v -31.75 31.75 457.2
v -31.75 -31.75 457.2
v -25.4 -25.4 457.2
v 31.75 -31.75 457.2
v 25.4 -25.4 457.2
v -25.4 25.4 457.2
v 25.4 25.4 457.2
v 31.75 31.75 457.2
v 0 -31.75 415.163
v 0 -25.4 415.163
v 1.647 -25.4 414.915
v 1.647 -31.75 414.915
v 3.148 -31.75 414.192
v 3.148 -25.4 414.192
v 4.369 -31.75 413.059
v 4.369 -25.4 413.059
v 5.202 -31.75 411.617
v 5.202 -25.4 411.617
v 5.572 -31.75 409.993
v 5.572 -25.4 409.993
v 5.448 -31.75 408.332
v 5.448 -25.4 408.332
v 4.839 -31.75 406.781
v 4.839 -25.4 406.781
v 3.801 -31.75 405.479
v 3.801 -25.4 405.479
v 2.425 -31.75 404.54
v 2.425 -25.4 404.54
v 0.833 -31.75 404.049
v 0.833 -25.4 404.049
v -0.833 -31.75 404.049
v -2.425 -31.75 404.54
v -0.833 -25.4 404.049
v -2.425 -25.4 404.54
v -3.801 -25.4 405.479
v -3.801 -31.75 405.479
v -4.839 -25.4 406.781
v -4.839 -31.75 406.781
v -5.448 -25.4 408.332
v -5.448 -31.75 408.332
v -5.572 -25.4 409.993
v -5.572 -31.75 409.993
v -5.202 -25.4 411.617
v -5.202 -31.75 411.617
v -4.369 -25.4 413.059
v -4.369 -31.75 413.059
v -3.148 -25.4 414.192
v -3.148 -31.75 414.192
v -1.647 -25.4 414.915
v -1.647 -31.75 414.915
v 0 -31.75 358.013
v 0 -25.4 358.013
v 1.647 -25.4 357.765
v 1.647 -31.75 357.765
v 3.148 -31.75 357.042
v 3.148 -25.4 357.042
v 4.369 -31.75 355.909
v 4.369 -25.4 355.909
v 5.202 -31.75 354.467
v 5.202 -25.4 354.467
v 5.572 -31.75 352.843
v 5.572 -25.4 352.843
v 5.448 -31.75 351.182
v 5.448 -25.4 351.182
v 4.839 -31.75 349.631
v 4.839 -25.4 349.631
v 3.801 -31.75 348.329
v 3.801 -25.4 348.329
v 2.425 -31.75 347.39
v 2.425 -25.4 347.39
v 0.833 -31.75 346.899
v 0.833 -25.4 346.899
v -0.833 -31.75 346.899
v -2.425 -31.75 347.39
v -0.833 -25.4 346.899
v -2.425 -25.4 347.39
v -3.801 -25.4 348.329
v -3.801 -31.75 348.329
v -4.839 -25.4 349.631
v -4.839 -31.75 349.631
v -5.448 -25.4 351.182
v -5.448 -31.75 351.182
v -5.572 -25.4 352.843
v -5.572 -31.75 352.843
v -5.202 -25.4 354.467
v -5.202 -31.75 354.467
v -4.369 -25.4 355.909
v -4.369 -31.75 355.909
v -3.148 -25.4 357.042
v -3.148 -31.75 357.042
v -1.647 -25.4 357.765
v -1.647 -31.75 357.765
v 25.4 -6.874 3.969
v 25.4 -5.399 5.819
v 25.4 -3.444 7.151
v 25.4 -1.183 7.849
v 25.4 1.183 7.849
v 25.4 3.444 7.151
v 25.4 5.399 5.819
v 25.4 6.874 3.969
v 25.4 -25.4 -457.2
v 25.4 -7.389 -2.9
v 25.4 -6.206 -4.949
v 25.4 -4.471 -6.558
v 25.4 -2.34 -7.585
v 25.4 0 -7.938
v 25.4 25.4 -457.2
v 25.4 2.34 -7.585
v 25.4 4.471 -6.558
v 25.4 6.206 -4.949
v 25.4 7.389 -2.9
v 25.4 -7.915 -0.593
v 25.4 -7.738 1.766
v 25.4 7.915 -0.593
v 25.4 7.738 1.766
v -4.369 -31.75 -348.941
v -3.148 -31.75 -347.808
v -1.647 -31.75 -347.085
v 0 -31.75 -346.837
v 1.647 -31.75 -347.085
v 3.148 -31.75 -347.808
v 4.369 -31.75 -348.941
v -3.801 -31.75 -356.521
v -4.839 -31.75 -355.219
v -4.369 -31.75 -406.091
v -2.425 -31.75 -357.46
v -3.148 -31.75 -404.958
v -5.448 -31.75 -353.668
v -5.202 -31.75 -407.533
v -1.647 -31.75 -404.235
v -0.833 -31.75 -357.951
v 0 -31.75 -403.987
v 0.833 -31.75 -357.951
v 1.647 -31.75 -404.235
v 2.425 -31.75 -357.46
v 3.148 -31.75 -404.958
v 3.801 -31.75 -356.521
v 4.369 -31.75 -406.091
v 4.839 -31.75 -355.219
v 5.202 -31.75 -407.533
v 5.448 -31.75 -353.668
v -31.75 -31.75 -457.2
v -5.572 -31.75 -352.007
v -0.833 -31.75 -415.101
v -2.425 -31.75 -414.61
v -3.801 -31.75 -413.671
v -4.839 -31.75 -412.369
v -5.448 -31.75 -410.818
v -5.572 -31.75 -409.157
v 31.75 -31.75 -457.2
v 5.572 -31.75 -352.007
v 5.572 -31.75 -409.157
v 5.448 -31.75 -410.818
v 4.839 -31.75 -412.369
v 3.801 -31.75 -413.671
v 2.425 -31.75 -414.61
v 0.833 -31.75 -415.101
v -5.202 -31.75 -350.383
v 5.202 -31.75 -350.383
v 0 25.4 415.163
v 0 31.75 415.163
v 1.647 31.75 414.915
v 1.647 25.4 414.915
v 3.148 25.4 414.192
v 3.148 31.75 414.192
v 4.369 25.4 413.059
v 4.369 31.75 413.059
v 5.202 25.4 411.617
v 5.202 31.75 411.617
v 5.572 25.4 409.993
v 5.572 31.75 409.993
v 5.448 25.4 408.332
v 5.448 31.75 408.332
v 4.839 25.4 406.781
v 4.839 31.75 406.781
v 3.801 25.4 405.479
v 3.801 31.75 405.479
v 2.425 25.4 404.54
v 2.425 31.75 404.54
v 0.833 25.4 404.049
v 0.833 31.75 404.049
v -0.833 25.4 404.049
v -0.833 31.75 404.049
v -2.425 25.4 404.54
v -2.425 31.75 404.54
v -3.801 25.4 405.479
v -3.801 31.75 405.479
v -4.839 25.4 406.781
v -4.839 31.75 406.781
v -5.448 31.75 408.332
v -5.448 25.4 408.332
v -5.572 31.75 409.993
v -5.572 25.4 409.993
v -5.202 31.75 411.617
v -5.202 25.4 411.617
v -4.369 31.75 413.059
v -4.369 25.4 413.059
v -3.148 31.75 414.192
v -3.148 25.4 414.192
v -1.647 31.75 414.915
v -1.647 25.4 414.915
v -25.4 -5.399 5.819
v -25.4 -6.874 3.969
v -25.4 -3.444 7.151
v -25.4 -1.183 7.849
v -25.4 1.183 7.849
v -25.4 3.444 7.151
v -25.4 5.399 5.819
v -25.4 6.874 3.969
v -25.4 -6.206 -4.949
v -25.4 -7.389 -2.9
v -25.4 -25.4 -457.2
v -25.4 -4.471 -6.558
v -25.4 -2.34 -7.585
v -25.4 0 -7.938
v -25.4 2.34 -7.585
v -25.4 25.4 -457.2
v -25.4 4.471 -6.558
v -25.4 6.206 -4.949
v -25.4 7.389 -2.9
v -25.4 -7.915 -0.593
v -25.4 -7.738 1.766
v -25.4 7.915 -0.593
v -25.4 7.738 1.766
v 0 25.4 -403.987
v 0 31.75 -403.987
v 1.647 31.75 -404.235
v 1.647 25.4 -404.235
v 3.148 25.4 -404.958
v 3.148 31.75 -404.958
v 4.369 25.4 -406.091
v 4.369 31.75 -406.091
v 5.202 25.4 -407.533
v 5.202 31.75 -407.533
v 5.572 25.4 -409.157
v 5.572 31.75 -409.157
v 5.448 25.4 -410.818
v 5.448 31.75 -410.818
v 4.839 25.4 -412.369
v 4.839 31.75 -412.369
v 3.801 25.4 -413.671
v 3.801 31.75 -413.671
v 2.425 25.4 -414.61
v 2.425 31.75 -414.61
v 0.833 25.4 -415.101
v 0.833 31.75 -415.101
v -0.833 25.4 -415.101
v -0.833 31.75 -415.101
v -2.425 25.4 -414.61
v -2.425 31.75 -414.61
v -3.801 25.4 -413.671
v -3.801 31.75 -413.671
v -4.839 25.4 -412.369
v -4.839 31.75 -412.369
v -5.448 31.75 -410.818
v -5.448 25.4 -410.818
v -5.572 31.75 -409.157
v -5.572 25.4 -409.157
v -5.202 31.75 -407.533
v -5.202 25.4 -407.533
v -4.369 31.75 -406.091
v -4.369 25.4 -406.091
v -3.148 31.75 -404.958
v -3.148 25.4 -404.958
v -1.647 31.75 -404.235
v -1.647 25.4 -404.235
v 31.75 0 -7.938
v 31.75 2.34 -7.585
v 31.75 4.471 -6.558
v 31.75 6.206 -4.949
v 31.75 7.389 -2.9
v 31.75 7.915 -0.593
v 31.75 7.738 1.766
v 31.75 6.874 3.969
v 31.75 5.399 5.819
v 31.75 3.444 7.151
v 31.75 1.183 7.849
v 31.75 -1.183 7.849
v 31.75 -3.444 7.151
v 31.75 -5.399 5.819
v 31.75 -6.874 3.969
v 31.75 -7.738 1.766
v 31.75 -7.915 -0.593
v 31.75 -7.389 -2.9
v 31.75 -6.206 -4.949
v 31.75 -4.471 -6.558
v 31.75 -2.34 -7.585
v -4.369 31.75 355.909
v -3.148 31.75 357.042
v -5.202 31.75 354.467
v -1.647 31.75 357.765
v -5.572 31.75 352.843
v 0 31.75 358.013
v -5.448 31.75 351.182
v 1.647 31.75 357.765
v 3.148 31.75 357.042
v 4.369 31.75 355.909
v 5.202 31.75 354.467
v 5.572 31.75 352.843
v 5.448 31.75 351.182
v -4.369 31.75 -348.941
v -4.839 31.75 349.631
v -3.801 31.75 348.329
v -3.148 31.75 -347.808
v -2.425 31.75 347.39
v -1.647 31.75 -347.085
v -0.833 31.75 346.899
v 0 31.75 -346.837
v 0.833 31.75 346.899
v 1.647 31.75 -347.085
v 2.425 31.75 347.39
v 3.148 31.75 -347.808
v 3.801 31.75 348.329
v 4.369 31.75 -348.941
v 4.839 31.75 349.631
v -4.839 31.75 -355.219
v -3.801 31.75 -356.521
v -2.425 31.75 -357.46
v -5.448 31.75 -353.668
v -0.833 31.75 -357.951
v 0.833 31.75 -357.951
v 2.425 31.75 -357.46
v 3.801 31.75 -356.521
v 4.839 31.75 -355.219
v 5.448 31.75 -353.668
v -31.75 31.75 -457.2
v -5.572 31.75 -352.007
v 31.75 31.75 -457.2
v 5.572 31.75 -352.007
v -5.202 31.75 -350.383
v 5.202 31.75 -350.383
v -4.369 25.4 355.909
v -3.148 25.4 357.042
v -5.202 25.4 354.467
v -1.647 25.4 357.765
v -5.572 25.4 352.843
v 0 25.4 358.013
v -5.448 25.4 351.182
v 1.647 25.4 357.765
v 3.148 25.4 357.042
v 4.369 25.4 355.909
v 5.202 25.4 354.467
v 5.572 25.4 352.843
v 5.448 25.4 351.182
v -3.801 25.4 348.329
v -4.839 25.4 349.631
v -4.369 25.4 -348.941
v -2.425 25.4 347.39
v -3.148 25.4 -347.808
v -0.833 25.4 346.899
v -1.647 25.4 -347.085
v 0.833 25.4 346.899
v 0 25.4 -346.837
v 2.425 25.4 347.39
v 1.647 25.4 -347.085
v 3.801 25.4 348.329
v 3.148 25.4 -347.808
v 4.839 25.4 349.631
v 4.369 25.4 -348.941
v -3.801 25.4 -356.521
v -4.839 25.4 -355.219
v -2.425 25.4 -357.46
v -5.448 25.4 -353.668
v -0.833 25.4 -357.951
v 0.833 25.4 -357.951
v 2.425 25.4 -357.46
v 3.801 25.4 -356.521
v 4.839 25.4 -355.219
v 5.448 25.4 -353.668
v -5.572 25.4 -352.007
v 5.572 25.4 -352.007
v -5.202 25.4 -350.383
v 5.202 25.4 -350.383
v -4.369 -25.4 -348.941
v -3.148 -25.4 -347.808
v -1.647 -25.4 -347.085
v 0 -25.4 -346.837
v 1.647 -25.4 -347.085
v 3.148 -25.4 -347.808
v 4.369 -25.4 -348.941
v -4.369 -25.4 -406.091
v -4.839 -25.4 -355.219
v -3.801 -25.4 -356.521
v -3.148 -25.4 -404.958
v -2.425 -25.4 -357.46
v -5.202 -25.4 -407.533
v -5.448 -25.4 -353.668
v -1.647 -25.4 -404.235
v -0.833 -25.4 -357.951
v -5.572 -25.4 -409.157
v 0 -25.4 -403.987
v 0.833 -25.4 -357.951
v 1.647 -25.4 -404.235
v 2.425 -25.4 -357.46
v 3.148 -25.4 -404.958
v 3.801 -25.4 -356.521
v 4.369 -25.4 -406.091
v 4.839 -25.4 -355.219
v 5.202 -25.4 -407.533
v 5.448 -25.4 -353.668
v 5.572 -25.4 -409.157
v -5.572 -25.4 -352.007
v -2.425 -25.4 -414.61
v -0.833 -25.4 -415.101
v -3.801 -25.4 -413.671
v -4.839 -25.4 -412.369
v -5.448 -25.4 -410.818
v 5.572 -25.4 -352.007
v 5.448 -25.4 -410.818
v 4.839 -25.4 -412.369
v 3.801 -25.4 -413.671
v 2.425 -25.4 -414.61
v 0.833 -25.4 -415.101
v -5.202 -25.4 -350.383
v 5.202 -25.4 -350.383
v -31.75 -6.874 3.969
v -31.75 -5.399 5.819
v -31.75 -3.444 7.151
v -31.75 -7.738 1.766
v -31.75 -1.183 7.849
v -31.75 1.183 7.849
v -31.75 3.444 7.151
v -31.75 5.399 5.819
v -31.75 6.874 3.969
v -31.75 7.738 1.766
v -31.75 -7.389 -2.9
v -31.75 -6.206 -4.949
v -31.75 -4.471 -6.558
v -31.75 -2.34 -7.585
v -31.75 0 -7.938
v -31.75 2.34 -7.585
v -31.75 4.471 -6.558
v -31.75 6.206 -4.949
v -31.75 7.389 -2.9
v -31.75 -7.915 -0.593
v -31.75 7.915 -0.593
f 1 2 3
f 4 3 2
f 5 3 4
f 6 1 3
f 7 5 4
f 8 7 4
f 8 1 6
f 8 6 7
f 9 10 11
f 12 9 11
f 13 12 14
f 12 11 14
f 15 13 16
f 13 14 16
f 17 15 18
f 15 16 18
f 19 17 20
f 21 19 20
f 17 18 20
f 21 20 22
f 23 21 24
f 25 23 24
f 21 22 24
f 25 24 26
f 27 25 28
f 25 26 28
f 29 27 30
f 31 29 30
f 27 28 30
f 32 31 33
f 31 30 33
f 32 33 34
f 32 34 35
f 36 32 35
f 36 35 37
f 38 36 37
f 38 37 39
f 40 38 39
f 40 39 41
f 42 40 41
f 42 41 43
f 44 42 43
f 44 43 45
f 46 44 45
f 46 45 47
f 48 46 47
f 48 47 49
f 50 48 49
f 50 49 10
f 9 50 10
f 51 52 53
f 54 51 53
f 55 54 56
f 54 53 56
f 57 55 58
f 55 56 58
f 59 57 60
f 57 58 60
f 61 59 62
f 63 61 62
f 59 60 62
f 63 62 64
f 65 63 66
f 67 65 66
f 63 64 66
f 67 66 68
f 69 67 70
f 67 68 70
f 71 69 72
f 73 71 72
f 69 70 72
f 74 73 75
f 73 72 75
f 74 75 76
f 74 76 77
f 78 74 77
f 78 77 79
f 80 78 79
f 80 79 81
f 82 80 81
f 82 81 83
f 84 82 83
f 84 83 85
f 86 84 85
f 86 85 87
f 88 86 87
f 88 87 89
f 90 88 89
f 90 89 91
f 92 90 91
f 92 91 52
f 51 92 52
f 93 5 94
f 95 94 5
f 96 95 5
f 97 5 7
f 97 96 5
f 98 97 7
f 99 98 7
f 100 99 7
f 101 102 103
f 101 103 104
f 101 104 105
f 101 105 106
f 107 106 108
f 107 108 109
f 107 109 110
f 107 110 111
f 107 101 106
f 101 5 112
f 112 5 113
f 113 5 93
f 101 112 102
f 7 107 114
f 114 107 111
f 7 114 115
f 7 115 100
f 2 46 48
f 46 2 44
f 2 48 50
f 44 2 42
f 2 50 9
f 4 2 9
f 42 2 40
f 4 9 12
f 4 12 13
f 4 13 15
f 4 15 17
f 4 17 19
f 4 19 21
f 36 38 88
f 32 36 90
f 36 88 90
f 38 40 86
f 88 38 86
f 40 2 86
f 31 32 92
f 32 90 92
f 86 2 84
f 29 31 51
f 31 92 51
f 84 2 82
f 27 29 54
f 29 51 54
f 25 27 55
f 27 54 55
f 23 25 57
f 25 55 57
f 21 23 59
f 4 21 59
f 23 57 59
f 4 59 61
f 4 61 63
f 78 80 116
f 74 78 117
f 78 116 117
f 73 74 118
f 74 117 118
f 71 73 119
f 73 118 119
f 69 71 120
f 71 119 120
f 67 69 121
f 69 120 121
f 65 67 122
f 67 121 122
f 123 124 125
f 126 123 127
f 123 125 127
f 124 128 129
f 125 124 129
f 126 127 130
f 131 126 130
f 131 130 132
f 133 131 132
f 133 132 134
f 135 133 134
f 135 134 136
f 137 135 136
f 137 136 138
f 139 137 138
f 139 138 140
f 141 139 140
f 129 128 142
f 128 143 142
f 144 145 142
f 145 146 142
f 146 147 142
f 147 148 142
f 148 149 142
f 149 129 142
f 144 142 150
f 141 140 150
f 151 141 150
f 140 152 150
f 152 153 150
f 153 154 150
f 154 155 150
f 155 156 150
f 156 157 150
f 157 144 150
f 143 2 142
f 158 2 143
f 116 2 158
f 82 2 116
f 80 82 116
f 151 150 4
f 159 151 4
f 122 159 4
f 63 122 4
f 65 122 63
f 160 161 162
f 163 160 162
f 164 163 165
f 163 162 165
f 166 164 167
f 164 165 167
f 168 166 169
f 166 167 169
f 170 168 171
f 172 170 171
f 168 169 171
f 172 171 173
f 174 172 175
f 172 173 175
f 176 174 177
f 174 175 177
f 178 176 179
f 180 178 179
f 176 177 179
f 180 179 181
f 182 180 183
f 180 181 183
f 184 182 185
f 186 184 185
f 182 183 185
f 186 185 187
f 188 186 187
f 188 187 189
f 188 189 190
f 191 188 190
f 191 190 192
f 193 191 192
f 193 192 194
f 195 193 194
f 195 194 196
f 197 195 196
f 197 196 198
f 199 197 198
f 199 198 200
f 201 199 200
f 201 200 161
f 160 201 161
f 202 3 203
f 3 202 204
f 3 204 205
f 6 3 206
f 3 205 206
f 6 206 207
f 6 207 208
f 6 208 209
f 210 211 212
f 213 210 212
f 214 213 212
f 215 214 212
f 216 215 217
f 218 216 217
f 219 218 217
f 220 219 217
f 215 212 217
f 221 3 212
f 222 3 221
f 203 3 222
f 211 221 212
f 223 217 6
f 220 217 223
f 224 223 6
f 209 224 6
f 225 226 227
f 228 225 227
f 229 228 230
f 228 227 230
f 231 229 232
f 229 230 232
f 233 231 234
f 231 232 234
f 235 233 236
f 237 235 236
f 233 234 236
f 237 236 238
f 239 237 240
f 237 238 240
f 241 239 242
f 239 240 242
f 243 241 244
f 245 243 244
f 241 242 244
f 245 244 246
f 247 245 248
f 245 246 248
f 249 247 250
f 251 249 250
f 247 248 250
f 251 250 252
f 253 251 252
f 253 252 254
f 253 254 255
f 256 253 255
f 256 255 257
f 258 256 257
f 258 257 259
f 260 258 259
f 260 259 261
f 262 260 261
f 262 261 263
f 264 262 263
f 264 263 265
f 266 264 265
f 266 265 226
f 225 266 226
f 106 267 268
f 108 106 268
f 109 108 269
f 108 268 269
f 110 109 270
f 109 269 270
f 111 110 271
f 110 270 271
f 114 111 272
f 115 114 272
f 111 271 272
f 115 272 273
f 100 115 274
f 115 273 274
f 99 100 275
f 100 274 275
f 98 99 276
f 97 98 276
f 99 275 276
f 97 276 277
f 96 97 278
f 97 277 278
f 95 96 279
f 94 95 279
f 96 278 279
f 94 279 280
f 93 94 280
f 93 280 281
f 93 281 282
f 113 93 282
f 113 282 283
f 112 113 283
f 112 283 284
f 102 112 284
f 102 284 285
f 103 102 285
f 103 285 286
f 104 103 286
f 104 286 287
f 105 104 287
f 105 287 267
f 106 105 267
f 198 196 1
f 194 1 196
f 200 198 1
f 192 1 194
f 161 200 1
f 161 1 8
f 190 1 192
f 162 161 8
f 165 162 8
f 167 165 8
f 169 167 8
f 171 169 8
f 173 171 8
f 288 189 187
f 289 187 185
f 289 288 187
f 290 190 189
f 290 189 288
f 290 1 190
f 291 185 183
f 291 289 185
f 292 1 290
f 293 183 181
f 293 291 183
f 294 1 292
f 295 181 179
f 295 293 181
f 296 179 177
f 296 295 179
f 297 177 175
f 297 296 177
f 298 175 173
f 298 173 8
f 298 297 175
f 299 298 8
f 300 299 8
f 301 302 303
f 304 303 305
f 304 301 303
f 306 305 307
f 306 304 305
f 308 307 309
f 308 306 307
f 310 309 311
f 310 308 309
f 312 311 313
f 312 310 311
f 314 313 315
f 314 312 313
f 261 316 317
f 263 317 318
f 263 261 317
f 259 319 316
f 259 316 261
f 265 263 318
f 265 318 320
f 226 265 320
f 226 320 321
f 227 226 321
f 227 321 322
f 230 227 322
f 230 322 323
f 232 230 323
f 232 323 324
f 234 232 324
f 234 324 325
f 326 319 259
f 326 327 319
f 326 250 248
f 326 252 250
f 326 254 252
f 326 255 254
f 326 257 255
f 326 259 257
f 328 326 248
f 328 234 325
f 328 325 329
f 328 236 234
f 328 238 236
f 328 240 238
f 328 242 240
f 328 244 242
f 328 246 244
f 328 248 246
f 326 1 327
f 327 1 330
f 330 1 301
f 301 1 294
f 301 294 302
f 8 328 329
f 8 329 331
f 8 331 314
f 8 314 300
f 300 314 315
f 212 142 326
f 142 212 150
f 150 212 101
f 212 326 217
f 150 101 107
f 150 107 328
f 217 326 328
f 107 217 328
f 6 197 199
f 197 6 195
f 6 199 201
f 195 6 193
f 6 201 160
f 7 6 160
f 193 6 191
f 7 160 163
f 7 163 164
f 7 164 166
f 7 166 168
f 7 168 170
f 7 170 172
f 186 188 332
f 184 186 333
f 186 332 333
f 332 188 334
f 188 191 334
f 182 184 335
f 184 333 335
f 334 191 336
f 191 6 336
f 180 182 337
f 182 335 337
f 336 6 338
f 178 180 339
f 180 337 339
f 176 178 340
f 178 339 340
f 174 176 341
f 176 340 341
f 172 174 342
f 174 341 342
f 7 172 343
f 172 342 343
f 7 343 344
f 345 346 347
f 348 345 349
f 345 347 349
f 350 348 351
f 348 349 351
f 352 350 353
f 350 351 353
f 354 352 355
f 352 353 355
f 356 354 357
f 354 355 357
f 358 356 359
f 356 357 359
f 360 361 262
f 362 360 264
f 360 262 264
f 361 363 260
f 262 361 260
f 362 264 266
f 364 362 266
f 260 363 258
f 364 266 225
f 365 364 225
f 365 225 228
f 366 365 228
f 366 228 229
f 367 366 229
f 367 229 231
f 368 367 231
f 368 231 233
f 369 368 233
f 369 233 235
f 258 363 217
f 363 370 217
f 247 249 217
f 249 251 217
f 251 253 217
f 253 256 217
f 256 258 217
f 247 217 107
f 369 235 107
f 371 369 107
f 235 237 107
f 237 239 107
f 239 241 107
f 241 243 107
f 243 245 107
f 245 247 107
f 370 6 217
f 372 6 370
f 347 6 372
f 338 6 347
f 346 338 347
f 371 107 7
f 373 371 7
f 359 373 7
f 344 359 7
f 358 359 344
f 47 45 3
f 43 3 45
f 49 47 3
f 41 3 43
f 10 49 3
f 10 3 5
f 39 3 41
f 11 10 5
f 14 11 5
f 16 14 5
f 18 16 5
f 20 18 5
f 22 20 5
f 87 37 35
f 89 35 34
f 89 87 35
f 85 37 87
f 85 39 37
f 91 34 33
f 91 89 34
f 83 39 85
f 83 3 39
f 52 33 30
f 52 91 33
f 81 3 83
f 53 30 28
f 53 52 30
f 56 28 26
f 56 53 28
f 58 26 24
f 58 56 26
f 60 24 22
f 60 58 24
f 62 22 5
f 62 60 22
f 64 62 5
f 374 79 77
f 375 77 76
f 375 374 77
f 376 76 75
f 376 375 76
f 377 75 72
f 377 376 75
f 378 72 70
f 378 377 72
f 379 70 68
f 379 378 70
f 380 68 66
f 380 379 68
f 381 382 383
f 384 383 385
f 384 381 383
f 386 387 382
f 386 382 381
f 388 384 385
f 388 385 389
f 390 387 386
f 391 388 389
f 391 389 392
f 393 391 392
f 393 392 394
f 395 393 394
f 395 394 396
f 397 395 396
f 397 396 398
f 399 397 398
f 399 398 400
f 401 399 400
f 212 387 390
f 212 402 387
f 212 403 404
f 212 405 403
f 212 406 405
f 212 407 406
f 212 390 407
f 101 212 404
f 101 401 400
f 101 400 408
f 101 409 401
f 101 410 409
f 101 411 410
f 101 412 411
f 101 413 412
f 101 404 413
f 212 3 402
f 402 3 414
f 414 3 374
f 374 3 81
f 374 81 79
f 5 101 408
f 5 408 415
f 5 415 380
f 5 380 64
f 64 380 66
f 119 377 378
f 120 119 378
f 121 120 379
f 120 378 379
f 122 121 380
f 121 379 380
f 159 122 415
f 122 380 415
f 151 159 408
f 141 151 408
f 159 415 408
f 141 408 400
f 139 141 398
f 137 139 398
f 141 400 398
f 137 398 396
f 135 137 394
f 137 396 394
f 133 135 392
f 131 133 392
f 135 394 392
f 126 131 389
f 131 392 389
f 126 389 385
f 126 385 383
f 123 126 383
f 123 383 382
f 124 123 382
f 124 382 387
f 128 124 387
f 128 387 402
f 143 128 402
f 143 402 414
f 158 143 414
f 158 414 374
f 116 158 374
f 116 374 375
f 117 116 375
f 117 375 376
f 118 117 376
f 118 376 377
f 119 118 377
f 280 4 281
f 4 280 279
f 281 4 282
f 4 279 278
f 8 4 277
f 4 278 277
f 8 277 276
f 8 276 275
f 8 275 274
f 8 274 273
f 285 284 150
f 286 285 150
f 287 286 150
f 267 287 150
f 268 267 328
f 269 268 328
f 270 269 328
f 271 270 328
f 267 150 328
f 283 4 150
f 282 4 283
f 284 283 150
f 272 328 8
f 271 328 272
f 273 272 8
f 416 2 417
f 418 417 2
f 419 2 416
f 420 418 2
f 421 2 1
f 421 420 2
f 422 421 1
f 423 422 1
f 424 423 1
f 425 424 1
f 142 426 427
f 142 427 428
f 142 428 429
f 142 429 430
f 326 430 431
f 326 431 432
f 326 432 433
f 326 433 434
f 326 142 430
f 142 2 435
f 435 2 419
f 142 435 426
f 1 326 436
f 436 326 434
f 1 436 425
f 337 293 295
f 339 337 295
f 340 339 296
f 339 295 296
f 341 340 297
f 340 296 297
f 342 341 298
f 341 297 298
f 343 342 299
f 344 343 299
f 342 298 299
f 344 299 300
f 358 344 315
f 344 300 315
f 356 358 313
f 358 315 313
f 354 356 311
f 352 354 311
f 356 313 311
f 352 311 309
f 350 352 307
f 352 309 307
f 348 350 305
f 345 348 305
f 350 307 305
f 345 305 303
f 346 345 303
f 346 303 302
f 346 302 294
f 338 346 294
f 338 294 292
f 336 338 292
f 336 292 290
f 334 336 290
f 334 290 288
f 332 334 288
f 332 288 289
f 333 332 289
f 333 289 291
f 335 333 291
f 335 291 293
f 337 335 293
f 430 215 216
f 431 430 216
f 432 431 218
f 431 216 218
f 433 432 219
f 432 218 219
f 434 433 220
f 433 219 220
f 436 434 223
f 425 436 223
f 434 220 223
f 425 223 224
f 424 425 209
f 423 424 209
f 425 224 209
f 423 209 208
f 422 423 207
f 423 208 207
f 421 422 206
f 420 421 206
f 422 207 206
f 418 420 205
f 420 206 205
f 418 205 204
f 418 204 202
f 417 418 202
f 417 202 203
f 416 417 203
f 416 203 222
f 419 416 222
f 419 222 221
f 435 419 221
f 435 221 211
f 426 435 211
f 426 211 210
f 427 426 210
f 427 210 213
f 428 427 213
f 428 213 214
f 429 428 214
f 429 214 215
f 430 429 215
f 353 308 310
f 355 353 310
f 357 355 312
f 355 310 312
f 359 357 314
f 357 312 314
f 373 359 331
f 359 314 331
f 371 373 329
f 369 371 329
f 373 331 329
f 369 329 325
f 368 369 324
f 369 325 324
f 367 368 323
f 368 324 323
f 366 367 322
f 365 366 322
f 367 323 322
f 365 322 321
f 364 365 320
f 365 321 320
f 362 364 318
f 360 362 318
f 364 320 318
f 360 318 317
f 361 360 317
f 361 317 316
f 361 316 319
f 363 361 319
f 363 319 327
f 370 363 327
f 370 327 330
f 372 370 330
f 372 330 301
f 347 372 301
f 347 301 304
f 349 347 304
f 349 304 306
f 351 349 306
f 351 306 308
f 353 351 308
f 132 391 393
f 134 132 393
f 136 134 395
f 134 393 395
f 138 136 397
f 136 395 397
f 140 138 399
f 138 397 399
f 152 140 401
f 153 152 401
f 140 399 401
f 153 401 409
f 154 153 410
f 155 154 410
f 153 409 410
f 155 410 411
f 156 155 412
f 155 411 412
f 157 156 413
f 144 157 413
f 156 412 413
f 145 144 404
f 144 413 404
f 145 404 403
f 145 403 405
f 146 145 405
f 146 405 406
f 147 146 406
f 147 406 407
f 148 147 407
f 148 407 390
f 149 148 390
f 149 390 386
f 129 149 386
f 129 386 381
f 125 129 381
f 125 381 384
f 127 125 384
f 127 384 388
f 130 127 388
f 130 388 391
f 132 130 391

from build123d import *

# Parameters (mm, degrees)
BOSS_EXTRUDE1_DEPTH      = 457.2
BOSS_EXTRUDE1_DEPTH_BACK = 457.2
SKETCH3_W                = 63.5
SKETCH3_H                = 63.5
SKETCH3_W_2              = 50.8
SKETCH3_H_2              = 50.8
SKETCH6_R                = 5.588
CUT_EXTRUDE1_DEPTH       = 463.679319291
SKETCH7_R                = 7.9375
CUT_EXTRUDE2_DEPTH       = 463.679319291


with BuildPart() as part:
    # Sketch3 → Boss-Extrude1 (new, two sides: drawn at the far end of the back side and taken through both)
    with BuildSketch(Plane.XY.offset(-BOSS_EXTRUDE1_DEPTH_BACK)):
        Rectangle(SKETCH3_W, SKETCH3_H)
        Rectangle(SKETCH3_W_2, SKETCH3_H_2, mode=Mode.SUBTRACT)
    extrude(amount=BOSS_EXTRUDE1_DEPTH + BOSS_EXTRUDE1_DEPTH_BACK)

    # Sketch6 → Cut-Extrude1 (cut, through all)
    with BuildSketch(Plane(origin=(0, 31.75, 0), x_dir=(1, 0, 0), z_dir=(0, 1, 0))):
        with Locations(Location((0, 409.575, 0), (0, 0, 270))):
            Circle(SKETCH6_R)
        with Locations(Location((0, -409.575, 0), (0, 0, 270))):
            Circle(SKETCH6_R)
        with Locations(Location((0, -352.425, 0), (0, 0, 270))):
            Circle(SKETCH6_R)
        with Locations(Location((0, 352.425, 0), (0, 0, 270))):
            Circle(SKETCH6_R)
    extrude(amount=-CUT_EXTRUDE1_DEPTH, mode=Mode.SUBTRACT)

    # Sketch7 → Cut-Extrude2 (cut, through all)
    with BuildSketch(Plane(origin=(31.75, 0, 0), x_dir=(0, 0, -1), z_dir=(1, 0, 0))):
        Circle(SKETCH7_R)
    extrude(amount=-CUT_EXTRUDE2_DEPTH, mode=Mode.SUBTRACT)


solid = part.part
